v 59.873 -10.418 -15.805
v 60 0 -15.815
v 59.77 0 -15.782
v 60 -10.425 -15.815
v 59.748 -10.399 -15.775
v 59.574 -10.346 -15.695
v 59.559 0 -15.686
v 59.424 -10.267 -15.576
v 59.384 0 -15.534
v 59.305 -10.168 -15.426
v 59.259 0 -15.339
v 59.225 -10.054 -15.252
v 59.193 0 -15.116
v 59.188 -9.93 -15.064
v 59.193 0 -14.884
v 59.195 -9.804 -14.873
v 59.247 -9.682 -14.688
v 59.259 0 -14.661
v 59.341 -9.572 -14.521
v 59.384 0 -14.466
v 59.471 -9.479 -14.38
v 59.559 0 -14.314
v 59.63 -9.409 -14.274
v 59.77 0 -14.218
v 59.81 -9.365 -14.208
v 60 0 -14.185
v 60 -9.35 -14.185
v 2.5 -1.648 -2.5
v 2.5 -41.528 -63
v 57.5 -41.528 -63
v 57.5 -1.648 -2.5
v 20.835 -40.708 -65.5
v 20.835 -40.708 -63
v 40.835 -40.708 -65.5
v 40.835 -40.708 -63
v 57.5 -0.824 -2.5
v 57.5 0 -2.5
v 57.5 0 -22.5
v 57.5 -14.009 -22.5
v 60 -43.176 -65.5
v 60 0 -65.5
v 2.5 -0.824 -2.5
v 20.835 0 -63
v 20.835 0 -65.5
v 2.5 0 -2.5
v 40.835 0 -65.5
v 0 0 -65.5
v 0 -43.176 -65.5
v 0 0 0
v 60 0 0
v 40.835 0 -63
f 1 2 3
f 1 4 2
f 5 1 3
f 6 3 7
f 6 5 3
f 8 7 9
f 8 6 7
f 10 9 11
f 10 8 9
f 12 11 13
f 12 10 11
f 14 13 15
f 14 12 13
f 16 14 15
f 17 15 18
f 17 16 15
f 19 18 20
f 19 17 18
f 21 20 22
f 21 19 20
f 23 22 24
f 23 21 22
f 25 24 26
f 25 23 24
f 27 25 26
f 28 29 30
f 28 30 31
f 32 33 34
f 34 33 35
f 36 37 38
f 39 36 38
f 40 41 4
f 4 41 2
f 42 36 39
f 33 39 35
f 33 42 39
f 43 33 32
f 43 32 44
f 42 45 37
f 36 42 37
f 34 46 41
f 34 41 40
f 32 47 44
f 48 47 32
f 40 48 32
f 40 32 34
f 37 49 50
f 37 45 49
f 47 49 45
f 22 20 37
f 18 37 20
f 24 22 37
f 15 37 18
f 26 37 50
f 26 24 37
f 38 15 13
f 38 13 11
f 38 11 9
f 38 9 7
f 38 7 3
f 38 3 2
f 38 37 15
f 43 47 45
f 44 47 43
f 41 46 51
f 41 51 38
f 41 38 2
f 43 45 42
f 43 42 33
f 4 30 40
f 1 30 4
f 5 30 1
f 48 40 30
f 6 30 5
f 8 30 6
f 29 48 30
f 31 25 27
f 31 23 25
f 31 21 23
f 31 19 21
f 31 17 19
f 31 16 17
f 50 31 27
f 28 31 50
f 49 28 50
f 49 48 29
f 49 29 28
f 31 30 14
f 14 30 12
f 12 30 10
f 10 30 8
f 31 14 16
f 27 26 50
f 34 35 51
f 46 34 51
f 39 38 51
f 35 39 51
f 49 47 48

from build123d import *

# Parameters (mm, degrees)
BOSS_EXTRUDE3_DEPTH      = 60
CUT_EXTRUDE1_REACH       = 100.764
SKETCH8_W                = 55
SKETCH8_H                = 60.5
BOSS_EXTRUDE4_DEPTH      = 56
BOSS_EXTRUDE7_REACH      = 100.764
SKETCH13_W               = 20
SKETCH13_H               = 40.707899827
CUT_EXTRUDE7_DEPTH       = 3
CUT_EXTRUDE10_DEPTH      = 99.7643787
CUT_EXTRUDE10_DEPTH_BACK = 99.7643787
SKETCH18_R               = 0.815


with BuildPart() as part:
    # Sketch6 → Boss-Extrude3 (new body)
    with BuildSketch(Plane(origin=(0, 0, 0), x_dir=(0, 0, -1), z_dir=(1, 0, 0))):
        Polygon((0, 0), (65.5, 0), (65.5, -43.17583236), align=None)
    extrude(amount=BOSS_EXTRUDE3_DEPTH)

    # Cut-Extrude1: up to this plane
    cut_extrude1_end = Plane(origin=(60, -43.17583236, -65.5), z_dir=(0, 0.8349267049075845, -0.5503611518195697))
    # Sketch8 → Cut-Extrude1 (cut, up to the surface)
    with BuildSketch(Plane(origin=(0, 0, 0), x_dir=(1, 0, 0), z_dir=(0, 1, 0)), mode=Mode.PRIVATE) as cut_extrude1_sk1:
        with Locations((30, 32.75)):
            Rectangle(SKETCH8_W, SKETCH8_H)
    cut_extrude1_tool1 = split(extrude(cut_extrude1_sk1.sketch, amount=-CUT_EXTRUDE1_REACH, mode=Mode.PRIVATE), bisect_by=cut_extrude1_end, keep=Keep.BOTH, mode=Mode.PRIVATE)
    add(cut_extrude1_tool1.solids().sort_by_distance((30, 0, -32.75))[0], mode=Mode.SUBTRACT)

    # Sketch9 → Boss-Extrude4 (add)
    with BuildSketch(Plane(origin=(2.5, 0, 0), x_dir=(0, 0, -1), z_dir=(1, 0, 0))):
        Polygon((2.5, -1.647932533), (2.5, -0.823966266), (63, -40.707899827), (63, -41.527899827), align=None)
    extrude(amount=BOSS_EXTRUDE4_DEPTH)

    # Boss-Extrude7: up to this plane
    boss_extrude7_end = Plane(origin=(58.5, -0.823966266, -2.5), z_dir=(0, -0.8349015528826996, 0.5503993068618971))
    # Sketch11 → Boss-Extrude7 (add, up to the surface)
    with BuildSketch(Plane(origin=(0, 0, 0), x_dir=(1, 0, 0), z_dir=(0, 1, 0)), mode=Mode.PRIVATE) as boss_extrude7_sk1:
        Polygon((57.5, 63), (57.5, 22.5), (40.834621514, 63), align=None)
    boss_extrude7_tool1 = split(extrude(boss_extrude7_sk1.sketch, amount=-BOSS_EXTRUDE7_REACH, mode=Mode.PRIVATE), bisect_by=boss_extrude7_end, keep=Keep.BOTH, mode=Mode.PRIVATE)
    add(boss_extrude7_tool1.solids().sort_by_distance((51.944874, 0, -49.5))[0])
    # Sketch11 → Boss-Extrude7 (add, up to the surface)
    with BuildSketch(Plane(origin=(0, 0, 0), x_dir=(1, 0, 0), z_dir=(0, 1, 0)), mode=Mode.PRIVATE) as boss_extrude7_sk2:
        Polygon((2.5, 63), (2.5, 2.5), (20.834621514, 63), align=None)
    boss_extrude7_tool2 = split(extrude(boss_extrude7_sk2.sketch, amount=-BOSS_EXTRUDE7_REACH, mode=Mode.PRIVATE), bisect_by=boss_extrude7_end, keep=Keep.BOTH, mode=Mode.PRIVATE)
    add(boss_extrude7_tool2.solids().sort_by_distance((8.611541, 0, -42.833333))[0])

    # Sketch13 → Cut-Extrude7 (cut)
    with BuildSketch(Plane.XY.offset(-63)):
        with Locations((30.834621514, -20.353949914)):
            Rectangle(SKETCH13_W, SKETCH13_H)
    extrude(amount=-CUT_EXTRUDE7_DEPTH, mode=Mode.SUBTRACT)

    # Sketch18 → Cut-Extrude10 (cut, two sides: drawn at the far end of the back side and taken through both)
    with BuildSketch(Plane(origin=(0, 0, 0), x_dir=(1, 0, 0), z_dir=(0, 1, 0)).offset(-CUT_EXTRUDE10_DEPTH_BACK)):
        with Locations((60, 15)):
            Circle(SKETCH18_R)
    extrude(amount=CUT_EXTRUDE10_DEPTH + CUT_EXTRUDE10_DEPTH_BACK, mode=Mode.SUBTRACT)


solid = part.part
